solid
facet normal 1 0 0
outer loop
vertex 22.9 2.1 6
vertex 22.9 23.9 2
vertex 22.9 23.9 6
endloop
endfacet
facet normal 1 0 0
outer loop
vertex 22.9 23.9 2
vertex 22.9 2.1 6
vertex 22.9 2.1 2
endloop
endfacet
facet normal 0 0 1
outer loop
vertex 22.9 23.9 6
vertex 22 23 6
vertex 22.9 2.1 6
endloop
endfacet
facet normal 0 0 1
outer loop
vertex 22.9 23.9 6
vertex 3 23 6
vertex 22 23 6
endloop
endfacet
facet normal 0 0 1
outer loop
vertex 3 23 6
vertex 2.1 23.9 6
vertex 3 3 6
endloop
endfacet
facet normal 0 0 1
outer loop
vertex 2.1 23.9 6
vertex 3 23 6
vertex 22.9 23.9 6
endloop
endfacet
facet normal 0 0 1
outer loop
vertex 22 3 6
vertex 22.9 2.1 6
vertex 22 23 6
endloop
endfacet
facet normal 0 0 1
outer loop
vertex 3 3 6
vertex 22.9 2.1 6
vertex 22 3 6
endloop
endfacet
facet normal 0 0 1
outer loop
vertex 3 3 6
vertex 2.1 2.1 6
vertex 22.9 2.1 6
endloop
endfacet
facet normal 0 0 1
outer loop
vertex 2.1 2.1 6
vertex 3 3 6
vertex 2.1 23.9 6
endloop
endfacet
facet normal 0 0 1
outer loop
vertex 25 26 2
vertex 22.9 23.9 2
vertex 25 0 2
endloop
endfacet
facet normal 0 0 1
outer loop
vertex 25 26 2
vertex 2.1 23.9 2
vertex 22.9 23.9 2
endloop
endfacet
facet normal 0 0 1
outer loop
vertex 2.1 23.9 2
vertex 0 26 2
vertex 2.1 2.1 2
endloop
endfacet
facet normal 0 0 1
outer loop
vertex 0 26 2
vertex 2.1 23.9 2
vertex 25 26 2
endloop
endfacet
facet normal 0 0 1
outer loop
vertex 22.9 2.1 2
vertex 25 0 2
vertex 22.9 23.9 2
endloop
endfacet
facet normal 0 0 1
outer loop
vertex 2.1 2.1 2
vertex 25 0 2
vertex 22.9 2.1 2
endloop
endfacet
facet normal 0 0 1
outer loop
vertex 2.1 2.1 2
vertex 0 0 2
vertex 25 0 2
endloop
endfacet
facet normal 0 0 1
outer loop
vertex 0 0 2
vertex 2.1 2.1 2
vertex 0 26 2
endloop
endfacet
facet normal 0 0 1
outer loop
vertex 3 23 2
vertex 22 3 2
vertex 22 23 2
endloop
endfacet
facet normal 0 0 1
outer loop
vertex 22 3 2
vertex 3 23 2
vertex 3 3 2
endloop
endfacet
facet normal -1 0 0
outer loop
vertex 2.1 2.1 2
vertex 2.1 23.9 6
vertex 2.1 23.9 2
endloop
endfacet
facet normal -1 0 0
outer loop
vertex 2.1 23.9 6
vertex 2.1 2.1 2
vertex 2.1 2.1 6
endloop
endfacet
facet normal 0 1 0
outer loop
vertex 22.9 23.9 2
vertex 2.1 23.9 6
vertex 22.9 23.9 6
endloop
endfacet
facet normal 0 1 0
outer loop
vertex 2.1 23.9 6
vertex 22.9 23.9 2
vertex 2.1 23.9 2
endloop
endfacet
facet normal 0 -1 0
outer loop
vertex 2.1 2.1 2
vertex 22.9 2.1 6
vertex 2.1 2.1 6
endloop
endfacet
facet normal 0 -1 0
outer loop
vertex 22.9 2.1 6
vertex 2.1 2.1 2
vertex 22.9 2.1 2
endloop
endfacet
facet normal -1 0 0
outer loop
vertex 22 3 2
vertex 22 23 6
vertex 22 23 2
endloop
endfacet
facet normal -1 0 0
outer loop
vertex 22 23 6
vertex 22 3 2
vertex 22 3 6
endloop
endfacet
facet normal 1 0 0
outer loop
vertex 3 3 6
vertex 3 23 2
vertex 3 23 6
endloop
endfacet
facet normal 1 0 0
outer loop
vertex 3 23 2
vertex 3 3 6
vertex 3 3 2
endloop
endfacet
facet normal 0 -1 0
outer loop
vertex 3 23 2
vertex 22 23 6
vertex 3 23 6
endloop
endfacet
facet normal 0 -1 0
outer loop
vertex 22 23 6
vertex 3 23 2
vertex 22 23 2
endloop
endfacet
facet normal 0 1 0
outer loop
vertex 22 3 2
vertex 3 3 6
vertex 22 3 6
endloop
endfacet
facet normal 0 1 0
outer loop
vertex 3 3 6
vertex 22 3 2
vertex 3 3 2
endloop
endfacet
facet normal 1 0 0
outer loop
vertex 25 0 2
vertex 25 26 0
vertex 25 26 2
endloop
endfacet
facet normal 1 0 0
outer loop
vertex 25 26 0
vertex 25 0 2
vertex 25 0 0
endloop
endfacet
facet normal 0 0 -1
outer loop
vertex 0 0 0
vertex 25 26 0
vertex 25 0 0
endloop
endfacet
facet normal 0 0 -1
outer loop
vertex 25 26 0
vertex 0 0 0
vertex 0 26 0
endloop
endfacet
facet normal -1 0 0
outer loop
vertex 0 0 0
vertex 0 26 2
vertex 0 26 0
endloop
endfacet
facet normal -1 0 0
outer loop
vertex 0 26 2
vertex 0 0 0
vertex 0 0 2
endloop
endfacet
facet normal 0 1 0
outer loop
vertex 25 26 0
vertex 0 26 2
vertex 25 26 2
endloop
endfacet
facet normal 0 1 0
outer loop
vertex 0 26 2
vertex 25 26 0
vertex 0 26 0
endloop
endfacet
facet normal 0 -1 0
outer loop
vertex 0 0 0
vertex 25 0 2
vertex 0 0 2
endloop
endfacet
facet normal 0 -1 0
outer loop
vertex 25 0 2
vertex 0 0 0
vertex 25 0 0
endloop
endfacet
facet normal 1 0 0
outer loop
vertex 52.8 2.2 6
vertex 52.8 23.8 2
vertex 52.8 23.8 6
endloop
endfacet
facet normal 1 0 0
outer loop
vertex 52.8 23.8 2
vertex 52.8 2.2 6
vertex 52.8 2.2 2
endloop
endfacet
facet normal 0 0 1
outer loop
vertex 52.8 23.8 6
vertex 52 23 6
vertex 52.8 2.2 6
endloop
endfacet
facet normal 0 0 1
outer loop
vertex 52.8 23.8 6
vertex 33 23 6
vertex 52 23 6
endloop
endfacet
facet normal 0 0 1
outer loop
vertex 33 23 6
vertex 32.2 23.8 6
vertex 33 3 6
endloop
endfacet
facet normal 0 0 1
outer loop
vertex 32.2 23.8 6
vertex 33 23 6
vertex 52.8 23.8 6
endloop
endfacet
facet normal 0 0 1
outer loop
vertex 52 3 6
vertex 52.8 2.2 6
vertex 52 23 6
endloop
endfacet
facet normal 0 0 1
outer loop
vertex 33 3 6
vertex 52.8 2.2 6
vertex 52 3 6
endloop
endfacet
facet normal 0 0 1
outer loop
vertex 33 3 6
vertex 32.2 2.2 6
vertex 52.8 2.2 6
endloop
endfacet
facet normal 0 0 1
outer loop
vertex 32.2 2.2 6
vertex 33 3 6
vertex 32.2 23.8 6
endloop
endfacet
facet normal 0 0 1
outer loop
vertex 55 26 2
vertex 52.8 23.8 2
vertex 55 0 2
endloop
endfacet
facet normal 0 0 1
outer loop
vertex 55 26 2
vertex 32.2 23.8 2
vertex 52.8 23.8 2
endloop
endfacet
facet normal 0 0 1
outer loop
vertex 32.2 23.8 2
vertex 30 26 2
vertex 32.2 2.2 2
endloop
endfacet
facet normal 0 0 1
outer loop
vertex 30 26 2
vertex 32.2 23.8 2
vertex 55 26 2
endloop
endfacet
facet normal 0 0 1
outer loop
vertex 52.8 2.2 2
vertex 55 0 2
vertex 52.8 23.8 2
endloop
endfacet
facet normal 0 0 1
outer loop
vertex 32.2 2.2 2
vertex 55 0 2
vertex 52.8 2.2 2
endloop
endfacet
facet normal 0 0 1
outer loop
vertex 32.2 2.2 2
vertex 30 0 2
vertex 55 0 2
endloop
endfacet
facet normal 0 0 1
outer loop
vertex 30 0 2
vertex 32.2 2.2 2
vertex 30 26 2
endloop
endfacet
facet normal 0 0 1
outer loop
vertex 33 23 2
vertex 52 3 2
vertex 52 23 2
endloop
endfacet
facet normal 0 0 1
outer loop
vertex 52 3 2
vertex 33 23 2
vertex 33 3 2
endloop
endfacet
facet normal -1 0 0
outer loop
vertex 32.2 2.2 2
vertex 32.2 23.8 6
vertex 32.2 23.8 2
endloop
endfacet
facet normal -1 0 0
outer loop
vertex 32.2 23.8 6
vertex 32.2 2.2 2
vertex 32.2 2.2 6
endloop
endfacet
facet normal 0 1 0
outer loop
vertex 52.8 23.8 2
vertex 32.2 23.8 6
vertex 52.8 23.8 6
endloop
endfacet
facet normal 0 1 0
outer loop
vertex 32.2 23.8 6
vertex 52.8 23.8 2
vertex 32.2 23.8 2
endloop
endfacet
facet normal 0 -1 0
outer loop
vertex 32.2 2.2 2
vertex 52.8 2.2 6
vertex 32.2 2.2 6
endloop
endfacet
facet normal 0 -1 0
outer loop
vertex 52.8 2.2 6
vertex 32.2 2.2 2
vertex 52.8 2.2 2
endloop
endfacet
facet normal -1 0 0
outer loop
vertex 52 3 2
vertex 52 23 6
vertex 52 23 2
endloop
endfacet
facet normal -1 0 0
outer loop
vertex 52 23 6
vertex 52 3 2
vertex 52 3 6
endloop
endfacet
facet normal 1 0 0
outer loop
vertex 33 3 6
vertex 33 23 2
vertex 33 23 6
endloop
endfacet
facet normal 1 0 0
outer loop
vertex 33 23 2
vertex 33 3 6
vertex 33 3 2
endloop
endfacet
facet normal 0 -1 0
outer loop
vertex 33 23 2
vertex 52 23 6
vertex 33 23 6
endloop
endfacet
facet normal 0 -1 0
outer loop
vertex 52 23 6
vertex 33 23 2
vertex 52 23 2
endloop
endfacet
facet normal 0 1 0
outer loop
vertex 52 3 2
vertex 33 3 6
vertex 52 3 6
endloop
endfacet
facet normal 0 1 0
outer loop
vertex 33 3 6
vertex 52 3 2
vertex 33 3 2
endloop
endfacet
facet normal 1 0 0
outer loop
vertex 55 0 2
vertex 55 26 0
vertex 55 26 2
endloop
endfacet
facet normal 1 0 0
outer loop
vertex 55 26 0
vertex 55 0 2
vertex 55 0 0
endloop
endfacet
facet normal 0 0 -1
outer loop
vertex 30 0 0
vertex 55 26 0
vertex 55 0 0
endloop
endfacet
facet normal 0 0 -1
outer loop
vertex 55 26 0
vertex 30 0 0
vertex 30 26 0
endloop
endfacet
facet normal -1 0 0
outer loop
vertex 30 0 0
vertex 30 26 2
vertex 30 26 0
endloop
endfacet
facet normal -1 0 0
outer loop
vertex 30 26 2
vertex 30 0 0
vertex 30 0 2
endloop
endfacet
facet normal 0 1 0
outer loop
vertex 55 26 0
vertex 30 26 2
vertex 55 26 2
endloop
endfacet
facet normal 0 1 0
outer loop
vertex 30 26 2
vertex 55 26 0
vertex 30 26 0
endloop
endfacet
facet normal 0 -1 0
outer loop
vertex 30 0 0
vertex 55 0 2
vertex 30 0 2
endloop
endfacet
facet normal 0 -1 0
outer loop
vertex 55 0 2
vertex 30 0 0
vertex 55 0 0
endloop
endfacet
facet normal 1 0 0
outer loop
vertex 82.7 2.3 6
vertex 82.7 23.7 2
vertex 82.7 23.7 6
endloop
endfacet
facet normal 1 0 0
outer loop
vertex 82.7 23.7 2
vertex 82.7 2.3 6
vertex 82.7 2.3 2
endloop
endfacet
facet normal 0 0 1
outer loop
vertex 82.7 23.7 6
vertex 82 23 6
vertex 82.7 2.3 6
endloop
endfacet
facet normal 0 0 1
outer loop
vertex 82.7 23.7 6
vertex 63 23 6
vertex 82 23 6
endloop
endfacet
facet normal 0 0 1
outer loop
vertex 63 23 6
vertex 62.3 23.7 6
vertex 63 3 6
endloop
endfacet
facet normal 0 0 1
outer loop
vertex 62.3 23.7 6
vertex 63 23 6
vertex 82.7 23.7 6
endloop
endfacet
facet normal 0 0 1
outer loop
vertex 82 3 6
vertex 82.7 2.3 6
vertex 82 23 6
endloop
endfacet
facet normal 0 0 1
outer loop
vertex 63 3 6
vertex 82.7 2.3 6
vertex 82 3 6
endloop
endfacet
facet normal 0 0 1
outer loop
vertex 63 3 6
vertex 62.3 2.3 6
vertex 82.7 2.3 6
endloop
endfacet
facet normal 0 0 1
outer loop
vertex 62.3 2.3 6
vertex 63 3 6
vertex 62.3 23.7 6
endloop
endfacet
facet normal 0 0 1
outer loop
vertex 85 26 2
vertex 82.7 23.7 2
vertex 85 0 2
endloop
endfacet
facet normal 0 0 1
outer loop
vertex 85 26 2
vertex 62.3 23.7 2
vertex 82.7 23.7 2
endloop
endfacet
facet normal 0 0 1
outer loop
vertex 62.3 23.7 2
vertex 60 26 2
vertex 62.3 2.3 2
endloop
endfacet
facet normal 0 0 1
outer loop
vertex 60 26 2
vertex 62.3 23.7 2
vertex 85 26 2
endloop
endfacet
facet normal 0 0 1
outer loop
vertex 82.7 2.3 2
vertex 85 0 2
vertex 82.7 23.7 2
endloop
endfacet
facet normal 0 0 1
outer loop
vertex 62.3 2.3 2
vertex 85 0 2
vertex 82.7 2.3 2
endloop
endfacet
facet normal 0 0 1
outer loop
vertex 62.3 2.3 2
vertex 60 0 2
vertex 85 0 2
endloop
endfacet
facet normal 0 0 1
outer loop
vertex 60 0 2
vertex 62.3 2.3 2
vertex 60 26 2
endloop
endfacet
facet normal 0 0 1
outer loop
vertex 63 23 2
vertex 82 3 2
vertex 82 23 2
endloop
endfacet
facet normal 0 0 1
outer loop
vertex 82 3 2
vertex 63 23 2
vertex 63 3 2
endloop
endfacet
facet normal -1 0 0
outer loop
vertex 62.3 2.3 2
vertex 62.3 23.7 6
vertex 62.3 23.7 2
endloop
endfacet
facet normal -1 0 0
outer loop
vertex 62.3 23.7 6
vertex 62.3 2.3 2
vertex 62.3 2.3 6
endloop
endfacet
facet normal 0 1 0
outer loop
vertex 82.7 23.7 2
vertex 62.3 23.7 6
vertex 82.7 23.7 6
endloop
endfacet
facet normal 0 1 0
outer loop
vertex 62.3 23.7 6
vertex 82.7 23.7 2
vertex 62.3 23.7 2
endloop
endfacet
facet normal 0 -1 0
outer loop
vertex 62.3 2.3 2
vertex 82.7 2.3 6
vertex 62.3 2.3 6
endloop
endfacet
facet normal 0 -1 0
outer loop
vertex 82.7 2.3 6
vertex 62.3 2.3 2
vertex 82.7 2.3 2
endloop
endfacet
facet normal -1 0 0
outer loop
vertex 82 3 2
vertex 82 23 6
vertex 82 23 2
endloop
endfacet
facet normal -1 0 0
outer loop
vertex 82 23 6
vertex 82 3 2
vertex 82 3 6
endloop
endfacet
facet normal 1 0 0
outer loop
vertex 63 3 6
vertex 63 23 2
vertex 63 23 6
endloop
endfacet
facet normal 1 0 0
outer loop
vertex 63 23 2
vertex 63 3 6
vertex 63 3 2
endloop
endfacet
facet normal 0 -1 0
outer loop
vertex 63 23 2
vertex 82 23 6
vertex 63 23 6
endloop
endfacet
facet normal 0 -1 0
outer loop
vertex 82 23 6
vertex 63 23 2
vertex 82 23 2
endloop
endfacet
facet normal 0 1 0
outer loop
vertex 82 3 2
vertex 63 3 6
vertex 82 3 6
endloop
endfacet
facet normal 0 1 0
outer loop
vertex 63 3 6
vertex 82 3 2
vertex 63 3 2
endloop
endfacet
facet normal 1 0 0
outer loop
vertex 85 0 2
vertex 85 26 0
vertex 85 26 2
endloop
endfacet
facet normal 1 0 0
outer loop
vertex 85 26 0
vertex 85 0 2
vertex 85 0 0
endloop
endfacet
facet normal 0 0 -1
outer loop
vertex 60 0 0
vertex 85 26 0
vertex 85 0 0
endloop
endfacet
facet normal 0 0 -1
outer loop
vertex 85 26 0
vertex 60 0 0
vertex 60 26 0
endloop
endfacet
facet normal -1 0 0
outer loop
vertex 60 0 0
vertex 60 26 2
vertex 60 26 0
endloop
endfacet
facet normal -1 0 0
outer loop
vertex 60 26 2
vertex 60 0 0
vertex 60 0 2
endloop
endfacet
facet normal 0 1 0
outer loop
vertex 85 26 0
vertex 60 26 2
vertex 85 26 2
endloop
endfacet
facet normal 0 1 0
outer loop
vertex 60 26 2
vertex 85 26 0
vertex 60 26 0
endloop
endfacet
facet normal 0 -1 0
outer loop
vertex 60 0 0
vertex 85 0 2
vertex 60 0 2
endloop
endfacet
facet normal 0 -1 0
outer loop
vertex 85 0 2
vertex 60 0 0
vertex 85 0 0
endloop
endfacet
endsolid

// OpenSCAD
// Konzola s excentricky ulozenym otvorom - jej otocenim je mozne vyrovnat policku do vodovahy.
//   hrubka - hrubka okolo konzoly
//   steps - odkrokovanie pre roznu hrubku konzoly (pre vyrovnanie policky do vodovahy - otocenim konzoly mozem posunut stranu policky vyssie/nizsie)
module konzola(priemer = 10, dlzka = 90, hrubka = 6, steps = 1, ponor = 10) {
    a = priemer + hrubka + hrubka + 2 * steps;
    b = priemer + hrubka + hrubka + 4 * steps;

    posx = hrubka + priemer / 2;
    posy = hrubka + steps + priemer / 2;

    difference() {
        cube([a, b, dlzka]);
        translate([posx, posy, 0]) cylinder(h = dlzka + 10, d = 10);
        translate([posx, posy, 0]) cylinder(h = 8, d = 19.5);
        translate([2, 2, dlzka - ponor]) cube([a - 4, b - 4, ponor + 5]);
    }
}

// korekcia - o kolko zmensit rozmer vnutorneho boxu aby sa dalo zasunut do otvoru
module krytka(priemer = 10, hrubka = 6, steps = 1, korekcia = 0.2) {
    a = priemer + hrubka + hrubka + 2 * steps;
    b = priemer + hrubka + hrubka + 4 * steps;
    union() {
        cube([a, b, 2]);
        difference() {
            translate([2 + korekcia/2, 2 + korekcia/2, 2])
                cube([a - 4 - korekcia, b - 4 - korekcia, 4]);
            translate([3, 3, 2]) cube([a - 6, b - 6, 4]);
        }
    }
}

// Konzoly trčia 6.2 , 6.8, 6.8, 7.8 cm
//konzola(steps = 0.5, hrubka = 7, ponor = 90-78);
translate([0,0,0]) krytka(steps = 0.5, hrubka = 7, korekcia=0.2);
translate([30,0,0]) krytka(steps = 0.5, hrubka = 7, korekcia=0.4);
translate([60,0,0]) krytka(steps = 0.5, hrubka = 7, korekcia=0.6);
